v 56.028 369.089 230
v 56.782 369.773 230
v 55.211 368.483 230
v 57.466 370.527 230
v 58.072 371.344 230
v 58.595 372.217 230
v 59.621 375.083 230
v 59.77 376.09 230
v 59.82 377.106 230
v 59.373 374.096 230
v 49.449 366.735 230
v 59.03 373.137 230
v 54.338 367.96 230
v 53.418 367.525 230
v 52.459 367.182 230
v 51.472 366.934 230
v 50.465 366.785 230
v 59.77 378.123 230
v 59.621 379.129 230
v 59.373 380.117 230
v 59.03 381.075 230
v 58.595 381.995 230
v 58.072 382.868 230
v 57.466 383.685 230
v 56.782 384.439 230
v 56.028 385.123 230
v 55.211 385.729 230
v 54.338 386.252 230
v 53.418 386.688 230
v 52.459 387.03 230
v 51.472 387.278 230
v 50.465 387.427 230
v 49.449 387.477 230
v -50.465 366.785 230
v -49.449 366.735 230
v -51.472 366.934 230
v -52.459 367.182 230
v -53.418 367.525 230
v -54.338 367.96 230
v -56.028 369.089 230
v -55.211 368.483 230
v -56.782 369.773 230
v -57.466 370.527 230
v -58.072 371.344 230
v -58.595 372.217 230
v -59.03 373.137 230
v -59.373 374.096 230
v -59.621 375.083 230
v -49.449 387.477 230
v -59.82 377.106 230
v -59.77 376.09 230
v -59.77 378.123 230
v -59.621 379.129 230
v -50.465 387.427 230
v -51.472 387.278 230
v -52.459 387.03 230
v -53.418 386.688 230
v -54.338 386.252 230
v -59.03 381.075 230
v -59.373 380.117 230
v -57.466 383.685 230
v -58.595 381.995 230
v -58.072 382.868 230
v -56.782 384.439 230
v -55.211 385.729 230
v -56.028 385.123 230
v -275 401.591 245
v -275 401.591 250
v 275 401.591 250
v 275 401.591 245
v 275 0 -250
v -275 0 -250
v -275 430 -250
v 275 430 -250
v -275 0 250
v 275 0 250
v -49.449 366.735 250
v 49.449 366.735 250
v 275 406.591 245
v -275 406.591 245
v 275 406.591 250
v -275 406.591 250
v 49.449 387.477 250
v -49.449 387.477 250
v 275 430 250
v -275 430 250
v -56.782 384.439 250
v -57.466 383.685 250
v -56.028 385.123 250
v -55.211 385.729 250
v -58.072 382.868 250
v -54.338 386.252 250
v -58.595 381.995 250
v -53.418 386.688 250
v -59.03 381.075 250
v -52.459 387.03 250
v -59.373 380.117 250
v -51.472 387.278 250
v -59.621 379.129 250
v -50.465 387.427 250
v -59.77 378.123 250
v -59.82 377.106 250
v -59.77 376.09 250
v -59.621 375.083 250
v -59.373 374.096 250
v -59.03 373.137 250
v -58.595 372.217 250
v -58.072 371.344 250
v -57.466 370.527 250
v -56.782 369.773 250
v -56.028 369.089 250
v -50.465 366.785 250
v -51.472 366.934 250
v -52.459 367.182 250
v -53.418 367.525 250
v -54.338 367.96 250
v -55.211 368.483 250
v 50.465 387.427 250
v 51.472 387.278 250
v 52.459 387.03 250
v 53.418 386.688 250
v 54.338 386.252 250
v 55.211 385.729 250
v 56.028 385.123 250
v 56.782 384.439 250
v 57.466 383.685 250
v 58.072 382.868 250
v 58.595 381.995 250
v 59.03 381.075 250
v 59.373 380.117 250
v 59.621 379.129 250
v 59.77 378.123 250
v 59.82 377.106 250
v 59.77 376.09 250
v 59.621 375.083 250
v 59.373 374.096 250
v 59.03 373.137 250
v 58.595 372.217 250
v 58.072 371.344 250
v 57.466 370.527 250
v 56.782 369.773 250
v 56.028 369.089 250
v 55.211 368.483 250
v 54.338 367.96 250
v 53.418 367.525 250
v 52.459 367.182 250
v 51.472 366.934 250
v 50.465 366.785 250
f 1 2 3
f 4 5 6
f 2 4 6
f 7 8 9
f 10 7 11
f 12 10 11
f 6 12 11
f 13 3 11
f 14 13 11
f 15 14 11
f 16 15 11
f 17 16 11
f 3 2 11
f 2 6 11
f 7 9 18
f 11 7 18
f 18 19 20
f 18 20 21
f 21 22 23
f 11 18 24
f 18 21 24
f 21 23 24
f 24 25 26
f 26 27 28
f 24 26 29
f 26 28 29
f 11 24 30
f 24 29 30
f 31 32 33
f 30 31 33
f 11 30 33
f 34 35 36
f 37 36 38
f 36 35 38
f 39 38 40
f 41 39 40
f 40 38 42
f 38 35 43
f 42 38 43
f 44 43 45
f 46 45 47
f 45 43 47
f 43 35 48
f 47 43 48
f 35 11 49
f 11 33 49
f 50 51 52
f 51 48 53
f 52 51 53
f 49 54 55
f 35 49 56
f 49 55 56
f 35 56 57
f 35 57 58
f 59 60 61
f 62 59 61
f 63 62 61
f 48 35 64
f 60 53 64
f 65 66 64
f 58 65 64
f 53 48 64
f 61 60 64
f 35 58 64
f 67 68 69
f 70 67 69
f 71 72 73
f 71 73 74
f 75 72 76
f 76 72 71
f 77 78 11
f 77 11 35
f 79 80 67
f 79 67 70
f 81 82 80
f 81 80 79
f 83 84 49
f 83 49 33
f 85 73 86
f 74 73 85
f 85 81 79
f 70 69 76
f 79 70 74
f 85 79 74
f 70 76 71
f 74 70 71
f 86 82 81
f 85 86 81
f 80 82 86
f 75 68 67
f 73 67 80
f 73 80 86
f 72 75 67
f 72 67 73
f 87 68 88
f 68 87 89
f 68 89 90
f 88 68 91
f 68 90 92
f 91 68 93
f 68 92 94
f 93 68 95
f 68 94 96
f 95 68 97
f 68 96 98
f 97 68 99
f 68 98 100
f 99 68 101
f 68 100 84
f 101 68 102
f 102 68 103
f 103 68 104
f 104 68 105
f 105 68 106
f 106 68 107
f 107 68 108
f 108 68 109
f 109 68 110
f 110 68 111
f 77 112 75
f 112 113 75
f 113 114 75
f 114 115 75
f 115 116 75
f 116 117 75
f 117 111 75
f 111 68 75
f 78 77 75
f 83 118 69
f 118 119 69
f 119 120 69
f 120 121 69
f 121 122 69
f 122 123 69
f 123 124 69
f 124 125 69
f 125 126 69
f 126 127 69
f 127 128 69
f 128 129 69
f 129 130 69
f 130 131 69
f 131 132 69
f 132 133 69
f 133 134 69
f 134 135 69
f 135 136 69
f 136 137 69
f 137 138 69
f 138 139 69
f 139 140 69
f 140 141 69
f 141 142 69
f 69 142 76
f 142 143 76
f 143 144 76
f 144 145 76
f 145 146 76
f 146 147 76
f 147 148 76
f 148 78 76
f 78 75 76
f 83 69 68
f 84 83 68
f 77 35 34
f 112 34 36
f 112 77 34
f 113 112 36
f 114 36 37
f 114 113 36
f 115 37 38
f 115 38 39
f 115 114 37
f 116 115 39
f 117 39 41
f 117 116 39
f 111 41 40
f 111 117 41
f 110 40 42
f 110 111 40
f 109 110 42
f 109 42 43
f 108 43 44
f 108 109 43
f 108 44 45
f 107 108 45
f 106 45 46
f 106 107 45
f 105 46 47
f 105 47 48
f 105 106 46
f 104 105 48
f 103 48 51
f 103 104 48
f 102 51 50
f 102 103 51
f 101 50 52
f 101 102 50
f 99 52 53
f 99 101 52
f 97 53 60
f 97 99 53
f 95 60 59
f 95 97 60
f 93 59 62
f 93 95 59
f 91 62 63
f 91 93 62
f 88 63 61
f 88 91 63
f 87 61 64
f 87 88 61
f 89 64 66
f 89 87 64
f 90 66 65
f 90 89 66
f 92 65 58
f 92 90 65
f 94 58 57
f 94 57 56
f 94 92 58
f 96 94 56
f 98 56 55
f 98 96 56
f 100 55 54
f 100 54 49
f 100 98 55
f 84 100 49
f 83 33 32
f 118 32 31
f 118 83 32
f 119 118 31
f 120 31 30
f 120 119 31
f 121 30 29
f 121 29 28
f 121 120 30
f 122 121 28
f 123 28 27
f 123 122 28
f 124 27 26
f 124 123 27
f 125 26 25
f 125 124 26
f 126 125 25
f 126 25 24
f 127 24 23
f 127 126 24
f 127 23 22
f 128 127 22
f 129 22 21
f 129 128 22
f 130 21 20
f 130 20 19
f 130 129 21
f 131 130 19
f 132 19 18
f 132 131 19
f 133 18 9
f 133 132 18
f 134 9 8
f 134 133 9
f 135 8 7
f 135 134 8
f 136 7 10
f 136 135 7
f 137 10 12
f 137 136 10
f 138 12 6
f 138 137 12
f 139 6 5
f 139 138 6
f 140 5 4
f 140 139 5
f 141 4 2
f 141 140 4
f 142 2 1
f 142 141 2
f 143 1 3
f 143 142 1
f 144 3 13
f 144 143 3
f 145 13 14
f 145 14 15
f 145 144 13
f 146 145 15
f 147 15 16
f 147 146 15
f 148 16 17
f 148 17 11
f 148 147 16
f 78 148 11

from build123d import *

# Parameters (mm, degrees)
SKETCH1_W           = 550
SKETCH1_H           = 500
BOSS_EXTRUDE1_DEPTH = 430
CUT_EXTRUDE1_DEPTH  = 20
SKETCH3_W           = 550
SKETCH3_H           = 5
CUT_EXTRUDE2_DEPTH  = 5


with BuildPart() as part:
    # Sketch1 → Boss-Extrude1 (new body)
    with BuildSketch(Plane(origin=(0, 0, 0), x_dir=(1, 0, 0), z_dir=(0, 1, 0))):
        Rectangle(SKETCH1_W, SKETCH1_H)
    extrude(amount=BOSS_EXTRUDE1_DEPTH)

    # Sketch2 → Cut-Extrude1 (cut)
    with BuildSketch(Plane.XY.offset(250)):
        with BuildLine():
            Line((-49.448842032, 387.477048559), (49.448842032, 387.477048559))
            ThreePointArc((49.448842032, 387.477048559), (59.819797821, 377.10609277), (49.448842032, 366.735136981))
            Line((49.448842032, 366.735136981), (-49.448842032, 366.735136981))
            ThreePointArc((-49.448842032, 366.735136981), (-59.819797821, 377.10609277), (-49.448842032, 387.477048559))
        make_face()
    extrude(amount=-CUT_EXTRUDE1_DEPTH, mode=Mode.SUBTRACT)

    # Sketch3 → Cut-Extrude2 (cut)
    with BuildSketch(Plane.XY.offset(250)):
        with Locations((0, 404.090827498)):
            Rectangle(SKETCH3_W, SKETCH3_H)
    extrude(amount=-CUT_EXTRUDE2_DEPTH, mode=Mode.SUBTRACT)


solid = part.part
